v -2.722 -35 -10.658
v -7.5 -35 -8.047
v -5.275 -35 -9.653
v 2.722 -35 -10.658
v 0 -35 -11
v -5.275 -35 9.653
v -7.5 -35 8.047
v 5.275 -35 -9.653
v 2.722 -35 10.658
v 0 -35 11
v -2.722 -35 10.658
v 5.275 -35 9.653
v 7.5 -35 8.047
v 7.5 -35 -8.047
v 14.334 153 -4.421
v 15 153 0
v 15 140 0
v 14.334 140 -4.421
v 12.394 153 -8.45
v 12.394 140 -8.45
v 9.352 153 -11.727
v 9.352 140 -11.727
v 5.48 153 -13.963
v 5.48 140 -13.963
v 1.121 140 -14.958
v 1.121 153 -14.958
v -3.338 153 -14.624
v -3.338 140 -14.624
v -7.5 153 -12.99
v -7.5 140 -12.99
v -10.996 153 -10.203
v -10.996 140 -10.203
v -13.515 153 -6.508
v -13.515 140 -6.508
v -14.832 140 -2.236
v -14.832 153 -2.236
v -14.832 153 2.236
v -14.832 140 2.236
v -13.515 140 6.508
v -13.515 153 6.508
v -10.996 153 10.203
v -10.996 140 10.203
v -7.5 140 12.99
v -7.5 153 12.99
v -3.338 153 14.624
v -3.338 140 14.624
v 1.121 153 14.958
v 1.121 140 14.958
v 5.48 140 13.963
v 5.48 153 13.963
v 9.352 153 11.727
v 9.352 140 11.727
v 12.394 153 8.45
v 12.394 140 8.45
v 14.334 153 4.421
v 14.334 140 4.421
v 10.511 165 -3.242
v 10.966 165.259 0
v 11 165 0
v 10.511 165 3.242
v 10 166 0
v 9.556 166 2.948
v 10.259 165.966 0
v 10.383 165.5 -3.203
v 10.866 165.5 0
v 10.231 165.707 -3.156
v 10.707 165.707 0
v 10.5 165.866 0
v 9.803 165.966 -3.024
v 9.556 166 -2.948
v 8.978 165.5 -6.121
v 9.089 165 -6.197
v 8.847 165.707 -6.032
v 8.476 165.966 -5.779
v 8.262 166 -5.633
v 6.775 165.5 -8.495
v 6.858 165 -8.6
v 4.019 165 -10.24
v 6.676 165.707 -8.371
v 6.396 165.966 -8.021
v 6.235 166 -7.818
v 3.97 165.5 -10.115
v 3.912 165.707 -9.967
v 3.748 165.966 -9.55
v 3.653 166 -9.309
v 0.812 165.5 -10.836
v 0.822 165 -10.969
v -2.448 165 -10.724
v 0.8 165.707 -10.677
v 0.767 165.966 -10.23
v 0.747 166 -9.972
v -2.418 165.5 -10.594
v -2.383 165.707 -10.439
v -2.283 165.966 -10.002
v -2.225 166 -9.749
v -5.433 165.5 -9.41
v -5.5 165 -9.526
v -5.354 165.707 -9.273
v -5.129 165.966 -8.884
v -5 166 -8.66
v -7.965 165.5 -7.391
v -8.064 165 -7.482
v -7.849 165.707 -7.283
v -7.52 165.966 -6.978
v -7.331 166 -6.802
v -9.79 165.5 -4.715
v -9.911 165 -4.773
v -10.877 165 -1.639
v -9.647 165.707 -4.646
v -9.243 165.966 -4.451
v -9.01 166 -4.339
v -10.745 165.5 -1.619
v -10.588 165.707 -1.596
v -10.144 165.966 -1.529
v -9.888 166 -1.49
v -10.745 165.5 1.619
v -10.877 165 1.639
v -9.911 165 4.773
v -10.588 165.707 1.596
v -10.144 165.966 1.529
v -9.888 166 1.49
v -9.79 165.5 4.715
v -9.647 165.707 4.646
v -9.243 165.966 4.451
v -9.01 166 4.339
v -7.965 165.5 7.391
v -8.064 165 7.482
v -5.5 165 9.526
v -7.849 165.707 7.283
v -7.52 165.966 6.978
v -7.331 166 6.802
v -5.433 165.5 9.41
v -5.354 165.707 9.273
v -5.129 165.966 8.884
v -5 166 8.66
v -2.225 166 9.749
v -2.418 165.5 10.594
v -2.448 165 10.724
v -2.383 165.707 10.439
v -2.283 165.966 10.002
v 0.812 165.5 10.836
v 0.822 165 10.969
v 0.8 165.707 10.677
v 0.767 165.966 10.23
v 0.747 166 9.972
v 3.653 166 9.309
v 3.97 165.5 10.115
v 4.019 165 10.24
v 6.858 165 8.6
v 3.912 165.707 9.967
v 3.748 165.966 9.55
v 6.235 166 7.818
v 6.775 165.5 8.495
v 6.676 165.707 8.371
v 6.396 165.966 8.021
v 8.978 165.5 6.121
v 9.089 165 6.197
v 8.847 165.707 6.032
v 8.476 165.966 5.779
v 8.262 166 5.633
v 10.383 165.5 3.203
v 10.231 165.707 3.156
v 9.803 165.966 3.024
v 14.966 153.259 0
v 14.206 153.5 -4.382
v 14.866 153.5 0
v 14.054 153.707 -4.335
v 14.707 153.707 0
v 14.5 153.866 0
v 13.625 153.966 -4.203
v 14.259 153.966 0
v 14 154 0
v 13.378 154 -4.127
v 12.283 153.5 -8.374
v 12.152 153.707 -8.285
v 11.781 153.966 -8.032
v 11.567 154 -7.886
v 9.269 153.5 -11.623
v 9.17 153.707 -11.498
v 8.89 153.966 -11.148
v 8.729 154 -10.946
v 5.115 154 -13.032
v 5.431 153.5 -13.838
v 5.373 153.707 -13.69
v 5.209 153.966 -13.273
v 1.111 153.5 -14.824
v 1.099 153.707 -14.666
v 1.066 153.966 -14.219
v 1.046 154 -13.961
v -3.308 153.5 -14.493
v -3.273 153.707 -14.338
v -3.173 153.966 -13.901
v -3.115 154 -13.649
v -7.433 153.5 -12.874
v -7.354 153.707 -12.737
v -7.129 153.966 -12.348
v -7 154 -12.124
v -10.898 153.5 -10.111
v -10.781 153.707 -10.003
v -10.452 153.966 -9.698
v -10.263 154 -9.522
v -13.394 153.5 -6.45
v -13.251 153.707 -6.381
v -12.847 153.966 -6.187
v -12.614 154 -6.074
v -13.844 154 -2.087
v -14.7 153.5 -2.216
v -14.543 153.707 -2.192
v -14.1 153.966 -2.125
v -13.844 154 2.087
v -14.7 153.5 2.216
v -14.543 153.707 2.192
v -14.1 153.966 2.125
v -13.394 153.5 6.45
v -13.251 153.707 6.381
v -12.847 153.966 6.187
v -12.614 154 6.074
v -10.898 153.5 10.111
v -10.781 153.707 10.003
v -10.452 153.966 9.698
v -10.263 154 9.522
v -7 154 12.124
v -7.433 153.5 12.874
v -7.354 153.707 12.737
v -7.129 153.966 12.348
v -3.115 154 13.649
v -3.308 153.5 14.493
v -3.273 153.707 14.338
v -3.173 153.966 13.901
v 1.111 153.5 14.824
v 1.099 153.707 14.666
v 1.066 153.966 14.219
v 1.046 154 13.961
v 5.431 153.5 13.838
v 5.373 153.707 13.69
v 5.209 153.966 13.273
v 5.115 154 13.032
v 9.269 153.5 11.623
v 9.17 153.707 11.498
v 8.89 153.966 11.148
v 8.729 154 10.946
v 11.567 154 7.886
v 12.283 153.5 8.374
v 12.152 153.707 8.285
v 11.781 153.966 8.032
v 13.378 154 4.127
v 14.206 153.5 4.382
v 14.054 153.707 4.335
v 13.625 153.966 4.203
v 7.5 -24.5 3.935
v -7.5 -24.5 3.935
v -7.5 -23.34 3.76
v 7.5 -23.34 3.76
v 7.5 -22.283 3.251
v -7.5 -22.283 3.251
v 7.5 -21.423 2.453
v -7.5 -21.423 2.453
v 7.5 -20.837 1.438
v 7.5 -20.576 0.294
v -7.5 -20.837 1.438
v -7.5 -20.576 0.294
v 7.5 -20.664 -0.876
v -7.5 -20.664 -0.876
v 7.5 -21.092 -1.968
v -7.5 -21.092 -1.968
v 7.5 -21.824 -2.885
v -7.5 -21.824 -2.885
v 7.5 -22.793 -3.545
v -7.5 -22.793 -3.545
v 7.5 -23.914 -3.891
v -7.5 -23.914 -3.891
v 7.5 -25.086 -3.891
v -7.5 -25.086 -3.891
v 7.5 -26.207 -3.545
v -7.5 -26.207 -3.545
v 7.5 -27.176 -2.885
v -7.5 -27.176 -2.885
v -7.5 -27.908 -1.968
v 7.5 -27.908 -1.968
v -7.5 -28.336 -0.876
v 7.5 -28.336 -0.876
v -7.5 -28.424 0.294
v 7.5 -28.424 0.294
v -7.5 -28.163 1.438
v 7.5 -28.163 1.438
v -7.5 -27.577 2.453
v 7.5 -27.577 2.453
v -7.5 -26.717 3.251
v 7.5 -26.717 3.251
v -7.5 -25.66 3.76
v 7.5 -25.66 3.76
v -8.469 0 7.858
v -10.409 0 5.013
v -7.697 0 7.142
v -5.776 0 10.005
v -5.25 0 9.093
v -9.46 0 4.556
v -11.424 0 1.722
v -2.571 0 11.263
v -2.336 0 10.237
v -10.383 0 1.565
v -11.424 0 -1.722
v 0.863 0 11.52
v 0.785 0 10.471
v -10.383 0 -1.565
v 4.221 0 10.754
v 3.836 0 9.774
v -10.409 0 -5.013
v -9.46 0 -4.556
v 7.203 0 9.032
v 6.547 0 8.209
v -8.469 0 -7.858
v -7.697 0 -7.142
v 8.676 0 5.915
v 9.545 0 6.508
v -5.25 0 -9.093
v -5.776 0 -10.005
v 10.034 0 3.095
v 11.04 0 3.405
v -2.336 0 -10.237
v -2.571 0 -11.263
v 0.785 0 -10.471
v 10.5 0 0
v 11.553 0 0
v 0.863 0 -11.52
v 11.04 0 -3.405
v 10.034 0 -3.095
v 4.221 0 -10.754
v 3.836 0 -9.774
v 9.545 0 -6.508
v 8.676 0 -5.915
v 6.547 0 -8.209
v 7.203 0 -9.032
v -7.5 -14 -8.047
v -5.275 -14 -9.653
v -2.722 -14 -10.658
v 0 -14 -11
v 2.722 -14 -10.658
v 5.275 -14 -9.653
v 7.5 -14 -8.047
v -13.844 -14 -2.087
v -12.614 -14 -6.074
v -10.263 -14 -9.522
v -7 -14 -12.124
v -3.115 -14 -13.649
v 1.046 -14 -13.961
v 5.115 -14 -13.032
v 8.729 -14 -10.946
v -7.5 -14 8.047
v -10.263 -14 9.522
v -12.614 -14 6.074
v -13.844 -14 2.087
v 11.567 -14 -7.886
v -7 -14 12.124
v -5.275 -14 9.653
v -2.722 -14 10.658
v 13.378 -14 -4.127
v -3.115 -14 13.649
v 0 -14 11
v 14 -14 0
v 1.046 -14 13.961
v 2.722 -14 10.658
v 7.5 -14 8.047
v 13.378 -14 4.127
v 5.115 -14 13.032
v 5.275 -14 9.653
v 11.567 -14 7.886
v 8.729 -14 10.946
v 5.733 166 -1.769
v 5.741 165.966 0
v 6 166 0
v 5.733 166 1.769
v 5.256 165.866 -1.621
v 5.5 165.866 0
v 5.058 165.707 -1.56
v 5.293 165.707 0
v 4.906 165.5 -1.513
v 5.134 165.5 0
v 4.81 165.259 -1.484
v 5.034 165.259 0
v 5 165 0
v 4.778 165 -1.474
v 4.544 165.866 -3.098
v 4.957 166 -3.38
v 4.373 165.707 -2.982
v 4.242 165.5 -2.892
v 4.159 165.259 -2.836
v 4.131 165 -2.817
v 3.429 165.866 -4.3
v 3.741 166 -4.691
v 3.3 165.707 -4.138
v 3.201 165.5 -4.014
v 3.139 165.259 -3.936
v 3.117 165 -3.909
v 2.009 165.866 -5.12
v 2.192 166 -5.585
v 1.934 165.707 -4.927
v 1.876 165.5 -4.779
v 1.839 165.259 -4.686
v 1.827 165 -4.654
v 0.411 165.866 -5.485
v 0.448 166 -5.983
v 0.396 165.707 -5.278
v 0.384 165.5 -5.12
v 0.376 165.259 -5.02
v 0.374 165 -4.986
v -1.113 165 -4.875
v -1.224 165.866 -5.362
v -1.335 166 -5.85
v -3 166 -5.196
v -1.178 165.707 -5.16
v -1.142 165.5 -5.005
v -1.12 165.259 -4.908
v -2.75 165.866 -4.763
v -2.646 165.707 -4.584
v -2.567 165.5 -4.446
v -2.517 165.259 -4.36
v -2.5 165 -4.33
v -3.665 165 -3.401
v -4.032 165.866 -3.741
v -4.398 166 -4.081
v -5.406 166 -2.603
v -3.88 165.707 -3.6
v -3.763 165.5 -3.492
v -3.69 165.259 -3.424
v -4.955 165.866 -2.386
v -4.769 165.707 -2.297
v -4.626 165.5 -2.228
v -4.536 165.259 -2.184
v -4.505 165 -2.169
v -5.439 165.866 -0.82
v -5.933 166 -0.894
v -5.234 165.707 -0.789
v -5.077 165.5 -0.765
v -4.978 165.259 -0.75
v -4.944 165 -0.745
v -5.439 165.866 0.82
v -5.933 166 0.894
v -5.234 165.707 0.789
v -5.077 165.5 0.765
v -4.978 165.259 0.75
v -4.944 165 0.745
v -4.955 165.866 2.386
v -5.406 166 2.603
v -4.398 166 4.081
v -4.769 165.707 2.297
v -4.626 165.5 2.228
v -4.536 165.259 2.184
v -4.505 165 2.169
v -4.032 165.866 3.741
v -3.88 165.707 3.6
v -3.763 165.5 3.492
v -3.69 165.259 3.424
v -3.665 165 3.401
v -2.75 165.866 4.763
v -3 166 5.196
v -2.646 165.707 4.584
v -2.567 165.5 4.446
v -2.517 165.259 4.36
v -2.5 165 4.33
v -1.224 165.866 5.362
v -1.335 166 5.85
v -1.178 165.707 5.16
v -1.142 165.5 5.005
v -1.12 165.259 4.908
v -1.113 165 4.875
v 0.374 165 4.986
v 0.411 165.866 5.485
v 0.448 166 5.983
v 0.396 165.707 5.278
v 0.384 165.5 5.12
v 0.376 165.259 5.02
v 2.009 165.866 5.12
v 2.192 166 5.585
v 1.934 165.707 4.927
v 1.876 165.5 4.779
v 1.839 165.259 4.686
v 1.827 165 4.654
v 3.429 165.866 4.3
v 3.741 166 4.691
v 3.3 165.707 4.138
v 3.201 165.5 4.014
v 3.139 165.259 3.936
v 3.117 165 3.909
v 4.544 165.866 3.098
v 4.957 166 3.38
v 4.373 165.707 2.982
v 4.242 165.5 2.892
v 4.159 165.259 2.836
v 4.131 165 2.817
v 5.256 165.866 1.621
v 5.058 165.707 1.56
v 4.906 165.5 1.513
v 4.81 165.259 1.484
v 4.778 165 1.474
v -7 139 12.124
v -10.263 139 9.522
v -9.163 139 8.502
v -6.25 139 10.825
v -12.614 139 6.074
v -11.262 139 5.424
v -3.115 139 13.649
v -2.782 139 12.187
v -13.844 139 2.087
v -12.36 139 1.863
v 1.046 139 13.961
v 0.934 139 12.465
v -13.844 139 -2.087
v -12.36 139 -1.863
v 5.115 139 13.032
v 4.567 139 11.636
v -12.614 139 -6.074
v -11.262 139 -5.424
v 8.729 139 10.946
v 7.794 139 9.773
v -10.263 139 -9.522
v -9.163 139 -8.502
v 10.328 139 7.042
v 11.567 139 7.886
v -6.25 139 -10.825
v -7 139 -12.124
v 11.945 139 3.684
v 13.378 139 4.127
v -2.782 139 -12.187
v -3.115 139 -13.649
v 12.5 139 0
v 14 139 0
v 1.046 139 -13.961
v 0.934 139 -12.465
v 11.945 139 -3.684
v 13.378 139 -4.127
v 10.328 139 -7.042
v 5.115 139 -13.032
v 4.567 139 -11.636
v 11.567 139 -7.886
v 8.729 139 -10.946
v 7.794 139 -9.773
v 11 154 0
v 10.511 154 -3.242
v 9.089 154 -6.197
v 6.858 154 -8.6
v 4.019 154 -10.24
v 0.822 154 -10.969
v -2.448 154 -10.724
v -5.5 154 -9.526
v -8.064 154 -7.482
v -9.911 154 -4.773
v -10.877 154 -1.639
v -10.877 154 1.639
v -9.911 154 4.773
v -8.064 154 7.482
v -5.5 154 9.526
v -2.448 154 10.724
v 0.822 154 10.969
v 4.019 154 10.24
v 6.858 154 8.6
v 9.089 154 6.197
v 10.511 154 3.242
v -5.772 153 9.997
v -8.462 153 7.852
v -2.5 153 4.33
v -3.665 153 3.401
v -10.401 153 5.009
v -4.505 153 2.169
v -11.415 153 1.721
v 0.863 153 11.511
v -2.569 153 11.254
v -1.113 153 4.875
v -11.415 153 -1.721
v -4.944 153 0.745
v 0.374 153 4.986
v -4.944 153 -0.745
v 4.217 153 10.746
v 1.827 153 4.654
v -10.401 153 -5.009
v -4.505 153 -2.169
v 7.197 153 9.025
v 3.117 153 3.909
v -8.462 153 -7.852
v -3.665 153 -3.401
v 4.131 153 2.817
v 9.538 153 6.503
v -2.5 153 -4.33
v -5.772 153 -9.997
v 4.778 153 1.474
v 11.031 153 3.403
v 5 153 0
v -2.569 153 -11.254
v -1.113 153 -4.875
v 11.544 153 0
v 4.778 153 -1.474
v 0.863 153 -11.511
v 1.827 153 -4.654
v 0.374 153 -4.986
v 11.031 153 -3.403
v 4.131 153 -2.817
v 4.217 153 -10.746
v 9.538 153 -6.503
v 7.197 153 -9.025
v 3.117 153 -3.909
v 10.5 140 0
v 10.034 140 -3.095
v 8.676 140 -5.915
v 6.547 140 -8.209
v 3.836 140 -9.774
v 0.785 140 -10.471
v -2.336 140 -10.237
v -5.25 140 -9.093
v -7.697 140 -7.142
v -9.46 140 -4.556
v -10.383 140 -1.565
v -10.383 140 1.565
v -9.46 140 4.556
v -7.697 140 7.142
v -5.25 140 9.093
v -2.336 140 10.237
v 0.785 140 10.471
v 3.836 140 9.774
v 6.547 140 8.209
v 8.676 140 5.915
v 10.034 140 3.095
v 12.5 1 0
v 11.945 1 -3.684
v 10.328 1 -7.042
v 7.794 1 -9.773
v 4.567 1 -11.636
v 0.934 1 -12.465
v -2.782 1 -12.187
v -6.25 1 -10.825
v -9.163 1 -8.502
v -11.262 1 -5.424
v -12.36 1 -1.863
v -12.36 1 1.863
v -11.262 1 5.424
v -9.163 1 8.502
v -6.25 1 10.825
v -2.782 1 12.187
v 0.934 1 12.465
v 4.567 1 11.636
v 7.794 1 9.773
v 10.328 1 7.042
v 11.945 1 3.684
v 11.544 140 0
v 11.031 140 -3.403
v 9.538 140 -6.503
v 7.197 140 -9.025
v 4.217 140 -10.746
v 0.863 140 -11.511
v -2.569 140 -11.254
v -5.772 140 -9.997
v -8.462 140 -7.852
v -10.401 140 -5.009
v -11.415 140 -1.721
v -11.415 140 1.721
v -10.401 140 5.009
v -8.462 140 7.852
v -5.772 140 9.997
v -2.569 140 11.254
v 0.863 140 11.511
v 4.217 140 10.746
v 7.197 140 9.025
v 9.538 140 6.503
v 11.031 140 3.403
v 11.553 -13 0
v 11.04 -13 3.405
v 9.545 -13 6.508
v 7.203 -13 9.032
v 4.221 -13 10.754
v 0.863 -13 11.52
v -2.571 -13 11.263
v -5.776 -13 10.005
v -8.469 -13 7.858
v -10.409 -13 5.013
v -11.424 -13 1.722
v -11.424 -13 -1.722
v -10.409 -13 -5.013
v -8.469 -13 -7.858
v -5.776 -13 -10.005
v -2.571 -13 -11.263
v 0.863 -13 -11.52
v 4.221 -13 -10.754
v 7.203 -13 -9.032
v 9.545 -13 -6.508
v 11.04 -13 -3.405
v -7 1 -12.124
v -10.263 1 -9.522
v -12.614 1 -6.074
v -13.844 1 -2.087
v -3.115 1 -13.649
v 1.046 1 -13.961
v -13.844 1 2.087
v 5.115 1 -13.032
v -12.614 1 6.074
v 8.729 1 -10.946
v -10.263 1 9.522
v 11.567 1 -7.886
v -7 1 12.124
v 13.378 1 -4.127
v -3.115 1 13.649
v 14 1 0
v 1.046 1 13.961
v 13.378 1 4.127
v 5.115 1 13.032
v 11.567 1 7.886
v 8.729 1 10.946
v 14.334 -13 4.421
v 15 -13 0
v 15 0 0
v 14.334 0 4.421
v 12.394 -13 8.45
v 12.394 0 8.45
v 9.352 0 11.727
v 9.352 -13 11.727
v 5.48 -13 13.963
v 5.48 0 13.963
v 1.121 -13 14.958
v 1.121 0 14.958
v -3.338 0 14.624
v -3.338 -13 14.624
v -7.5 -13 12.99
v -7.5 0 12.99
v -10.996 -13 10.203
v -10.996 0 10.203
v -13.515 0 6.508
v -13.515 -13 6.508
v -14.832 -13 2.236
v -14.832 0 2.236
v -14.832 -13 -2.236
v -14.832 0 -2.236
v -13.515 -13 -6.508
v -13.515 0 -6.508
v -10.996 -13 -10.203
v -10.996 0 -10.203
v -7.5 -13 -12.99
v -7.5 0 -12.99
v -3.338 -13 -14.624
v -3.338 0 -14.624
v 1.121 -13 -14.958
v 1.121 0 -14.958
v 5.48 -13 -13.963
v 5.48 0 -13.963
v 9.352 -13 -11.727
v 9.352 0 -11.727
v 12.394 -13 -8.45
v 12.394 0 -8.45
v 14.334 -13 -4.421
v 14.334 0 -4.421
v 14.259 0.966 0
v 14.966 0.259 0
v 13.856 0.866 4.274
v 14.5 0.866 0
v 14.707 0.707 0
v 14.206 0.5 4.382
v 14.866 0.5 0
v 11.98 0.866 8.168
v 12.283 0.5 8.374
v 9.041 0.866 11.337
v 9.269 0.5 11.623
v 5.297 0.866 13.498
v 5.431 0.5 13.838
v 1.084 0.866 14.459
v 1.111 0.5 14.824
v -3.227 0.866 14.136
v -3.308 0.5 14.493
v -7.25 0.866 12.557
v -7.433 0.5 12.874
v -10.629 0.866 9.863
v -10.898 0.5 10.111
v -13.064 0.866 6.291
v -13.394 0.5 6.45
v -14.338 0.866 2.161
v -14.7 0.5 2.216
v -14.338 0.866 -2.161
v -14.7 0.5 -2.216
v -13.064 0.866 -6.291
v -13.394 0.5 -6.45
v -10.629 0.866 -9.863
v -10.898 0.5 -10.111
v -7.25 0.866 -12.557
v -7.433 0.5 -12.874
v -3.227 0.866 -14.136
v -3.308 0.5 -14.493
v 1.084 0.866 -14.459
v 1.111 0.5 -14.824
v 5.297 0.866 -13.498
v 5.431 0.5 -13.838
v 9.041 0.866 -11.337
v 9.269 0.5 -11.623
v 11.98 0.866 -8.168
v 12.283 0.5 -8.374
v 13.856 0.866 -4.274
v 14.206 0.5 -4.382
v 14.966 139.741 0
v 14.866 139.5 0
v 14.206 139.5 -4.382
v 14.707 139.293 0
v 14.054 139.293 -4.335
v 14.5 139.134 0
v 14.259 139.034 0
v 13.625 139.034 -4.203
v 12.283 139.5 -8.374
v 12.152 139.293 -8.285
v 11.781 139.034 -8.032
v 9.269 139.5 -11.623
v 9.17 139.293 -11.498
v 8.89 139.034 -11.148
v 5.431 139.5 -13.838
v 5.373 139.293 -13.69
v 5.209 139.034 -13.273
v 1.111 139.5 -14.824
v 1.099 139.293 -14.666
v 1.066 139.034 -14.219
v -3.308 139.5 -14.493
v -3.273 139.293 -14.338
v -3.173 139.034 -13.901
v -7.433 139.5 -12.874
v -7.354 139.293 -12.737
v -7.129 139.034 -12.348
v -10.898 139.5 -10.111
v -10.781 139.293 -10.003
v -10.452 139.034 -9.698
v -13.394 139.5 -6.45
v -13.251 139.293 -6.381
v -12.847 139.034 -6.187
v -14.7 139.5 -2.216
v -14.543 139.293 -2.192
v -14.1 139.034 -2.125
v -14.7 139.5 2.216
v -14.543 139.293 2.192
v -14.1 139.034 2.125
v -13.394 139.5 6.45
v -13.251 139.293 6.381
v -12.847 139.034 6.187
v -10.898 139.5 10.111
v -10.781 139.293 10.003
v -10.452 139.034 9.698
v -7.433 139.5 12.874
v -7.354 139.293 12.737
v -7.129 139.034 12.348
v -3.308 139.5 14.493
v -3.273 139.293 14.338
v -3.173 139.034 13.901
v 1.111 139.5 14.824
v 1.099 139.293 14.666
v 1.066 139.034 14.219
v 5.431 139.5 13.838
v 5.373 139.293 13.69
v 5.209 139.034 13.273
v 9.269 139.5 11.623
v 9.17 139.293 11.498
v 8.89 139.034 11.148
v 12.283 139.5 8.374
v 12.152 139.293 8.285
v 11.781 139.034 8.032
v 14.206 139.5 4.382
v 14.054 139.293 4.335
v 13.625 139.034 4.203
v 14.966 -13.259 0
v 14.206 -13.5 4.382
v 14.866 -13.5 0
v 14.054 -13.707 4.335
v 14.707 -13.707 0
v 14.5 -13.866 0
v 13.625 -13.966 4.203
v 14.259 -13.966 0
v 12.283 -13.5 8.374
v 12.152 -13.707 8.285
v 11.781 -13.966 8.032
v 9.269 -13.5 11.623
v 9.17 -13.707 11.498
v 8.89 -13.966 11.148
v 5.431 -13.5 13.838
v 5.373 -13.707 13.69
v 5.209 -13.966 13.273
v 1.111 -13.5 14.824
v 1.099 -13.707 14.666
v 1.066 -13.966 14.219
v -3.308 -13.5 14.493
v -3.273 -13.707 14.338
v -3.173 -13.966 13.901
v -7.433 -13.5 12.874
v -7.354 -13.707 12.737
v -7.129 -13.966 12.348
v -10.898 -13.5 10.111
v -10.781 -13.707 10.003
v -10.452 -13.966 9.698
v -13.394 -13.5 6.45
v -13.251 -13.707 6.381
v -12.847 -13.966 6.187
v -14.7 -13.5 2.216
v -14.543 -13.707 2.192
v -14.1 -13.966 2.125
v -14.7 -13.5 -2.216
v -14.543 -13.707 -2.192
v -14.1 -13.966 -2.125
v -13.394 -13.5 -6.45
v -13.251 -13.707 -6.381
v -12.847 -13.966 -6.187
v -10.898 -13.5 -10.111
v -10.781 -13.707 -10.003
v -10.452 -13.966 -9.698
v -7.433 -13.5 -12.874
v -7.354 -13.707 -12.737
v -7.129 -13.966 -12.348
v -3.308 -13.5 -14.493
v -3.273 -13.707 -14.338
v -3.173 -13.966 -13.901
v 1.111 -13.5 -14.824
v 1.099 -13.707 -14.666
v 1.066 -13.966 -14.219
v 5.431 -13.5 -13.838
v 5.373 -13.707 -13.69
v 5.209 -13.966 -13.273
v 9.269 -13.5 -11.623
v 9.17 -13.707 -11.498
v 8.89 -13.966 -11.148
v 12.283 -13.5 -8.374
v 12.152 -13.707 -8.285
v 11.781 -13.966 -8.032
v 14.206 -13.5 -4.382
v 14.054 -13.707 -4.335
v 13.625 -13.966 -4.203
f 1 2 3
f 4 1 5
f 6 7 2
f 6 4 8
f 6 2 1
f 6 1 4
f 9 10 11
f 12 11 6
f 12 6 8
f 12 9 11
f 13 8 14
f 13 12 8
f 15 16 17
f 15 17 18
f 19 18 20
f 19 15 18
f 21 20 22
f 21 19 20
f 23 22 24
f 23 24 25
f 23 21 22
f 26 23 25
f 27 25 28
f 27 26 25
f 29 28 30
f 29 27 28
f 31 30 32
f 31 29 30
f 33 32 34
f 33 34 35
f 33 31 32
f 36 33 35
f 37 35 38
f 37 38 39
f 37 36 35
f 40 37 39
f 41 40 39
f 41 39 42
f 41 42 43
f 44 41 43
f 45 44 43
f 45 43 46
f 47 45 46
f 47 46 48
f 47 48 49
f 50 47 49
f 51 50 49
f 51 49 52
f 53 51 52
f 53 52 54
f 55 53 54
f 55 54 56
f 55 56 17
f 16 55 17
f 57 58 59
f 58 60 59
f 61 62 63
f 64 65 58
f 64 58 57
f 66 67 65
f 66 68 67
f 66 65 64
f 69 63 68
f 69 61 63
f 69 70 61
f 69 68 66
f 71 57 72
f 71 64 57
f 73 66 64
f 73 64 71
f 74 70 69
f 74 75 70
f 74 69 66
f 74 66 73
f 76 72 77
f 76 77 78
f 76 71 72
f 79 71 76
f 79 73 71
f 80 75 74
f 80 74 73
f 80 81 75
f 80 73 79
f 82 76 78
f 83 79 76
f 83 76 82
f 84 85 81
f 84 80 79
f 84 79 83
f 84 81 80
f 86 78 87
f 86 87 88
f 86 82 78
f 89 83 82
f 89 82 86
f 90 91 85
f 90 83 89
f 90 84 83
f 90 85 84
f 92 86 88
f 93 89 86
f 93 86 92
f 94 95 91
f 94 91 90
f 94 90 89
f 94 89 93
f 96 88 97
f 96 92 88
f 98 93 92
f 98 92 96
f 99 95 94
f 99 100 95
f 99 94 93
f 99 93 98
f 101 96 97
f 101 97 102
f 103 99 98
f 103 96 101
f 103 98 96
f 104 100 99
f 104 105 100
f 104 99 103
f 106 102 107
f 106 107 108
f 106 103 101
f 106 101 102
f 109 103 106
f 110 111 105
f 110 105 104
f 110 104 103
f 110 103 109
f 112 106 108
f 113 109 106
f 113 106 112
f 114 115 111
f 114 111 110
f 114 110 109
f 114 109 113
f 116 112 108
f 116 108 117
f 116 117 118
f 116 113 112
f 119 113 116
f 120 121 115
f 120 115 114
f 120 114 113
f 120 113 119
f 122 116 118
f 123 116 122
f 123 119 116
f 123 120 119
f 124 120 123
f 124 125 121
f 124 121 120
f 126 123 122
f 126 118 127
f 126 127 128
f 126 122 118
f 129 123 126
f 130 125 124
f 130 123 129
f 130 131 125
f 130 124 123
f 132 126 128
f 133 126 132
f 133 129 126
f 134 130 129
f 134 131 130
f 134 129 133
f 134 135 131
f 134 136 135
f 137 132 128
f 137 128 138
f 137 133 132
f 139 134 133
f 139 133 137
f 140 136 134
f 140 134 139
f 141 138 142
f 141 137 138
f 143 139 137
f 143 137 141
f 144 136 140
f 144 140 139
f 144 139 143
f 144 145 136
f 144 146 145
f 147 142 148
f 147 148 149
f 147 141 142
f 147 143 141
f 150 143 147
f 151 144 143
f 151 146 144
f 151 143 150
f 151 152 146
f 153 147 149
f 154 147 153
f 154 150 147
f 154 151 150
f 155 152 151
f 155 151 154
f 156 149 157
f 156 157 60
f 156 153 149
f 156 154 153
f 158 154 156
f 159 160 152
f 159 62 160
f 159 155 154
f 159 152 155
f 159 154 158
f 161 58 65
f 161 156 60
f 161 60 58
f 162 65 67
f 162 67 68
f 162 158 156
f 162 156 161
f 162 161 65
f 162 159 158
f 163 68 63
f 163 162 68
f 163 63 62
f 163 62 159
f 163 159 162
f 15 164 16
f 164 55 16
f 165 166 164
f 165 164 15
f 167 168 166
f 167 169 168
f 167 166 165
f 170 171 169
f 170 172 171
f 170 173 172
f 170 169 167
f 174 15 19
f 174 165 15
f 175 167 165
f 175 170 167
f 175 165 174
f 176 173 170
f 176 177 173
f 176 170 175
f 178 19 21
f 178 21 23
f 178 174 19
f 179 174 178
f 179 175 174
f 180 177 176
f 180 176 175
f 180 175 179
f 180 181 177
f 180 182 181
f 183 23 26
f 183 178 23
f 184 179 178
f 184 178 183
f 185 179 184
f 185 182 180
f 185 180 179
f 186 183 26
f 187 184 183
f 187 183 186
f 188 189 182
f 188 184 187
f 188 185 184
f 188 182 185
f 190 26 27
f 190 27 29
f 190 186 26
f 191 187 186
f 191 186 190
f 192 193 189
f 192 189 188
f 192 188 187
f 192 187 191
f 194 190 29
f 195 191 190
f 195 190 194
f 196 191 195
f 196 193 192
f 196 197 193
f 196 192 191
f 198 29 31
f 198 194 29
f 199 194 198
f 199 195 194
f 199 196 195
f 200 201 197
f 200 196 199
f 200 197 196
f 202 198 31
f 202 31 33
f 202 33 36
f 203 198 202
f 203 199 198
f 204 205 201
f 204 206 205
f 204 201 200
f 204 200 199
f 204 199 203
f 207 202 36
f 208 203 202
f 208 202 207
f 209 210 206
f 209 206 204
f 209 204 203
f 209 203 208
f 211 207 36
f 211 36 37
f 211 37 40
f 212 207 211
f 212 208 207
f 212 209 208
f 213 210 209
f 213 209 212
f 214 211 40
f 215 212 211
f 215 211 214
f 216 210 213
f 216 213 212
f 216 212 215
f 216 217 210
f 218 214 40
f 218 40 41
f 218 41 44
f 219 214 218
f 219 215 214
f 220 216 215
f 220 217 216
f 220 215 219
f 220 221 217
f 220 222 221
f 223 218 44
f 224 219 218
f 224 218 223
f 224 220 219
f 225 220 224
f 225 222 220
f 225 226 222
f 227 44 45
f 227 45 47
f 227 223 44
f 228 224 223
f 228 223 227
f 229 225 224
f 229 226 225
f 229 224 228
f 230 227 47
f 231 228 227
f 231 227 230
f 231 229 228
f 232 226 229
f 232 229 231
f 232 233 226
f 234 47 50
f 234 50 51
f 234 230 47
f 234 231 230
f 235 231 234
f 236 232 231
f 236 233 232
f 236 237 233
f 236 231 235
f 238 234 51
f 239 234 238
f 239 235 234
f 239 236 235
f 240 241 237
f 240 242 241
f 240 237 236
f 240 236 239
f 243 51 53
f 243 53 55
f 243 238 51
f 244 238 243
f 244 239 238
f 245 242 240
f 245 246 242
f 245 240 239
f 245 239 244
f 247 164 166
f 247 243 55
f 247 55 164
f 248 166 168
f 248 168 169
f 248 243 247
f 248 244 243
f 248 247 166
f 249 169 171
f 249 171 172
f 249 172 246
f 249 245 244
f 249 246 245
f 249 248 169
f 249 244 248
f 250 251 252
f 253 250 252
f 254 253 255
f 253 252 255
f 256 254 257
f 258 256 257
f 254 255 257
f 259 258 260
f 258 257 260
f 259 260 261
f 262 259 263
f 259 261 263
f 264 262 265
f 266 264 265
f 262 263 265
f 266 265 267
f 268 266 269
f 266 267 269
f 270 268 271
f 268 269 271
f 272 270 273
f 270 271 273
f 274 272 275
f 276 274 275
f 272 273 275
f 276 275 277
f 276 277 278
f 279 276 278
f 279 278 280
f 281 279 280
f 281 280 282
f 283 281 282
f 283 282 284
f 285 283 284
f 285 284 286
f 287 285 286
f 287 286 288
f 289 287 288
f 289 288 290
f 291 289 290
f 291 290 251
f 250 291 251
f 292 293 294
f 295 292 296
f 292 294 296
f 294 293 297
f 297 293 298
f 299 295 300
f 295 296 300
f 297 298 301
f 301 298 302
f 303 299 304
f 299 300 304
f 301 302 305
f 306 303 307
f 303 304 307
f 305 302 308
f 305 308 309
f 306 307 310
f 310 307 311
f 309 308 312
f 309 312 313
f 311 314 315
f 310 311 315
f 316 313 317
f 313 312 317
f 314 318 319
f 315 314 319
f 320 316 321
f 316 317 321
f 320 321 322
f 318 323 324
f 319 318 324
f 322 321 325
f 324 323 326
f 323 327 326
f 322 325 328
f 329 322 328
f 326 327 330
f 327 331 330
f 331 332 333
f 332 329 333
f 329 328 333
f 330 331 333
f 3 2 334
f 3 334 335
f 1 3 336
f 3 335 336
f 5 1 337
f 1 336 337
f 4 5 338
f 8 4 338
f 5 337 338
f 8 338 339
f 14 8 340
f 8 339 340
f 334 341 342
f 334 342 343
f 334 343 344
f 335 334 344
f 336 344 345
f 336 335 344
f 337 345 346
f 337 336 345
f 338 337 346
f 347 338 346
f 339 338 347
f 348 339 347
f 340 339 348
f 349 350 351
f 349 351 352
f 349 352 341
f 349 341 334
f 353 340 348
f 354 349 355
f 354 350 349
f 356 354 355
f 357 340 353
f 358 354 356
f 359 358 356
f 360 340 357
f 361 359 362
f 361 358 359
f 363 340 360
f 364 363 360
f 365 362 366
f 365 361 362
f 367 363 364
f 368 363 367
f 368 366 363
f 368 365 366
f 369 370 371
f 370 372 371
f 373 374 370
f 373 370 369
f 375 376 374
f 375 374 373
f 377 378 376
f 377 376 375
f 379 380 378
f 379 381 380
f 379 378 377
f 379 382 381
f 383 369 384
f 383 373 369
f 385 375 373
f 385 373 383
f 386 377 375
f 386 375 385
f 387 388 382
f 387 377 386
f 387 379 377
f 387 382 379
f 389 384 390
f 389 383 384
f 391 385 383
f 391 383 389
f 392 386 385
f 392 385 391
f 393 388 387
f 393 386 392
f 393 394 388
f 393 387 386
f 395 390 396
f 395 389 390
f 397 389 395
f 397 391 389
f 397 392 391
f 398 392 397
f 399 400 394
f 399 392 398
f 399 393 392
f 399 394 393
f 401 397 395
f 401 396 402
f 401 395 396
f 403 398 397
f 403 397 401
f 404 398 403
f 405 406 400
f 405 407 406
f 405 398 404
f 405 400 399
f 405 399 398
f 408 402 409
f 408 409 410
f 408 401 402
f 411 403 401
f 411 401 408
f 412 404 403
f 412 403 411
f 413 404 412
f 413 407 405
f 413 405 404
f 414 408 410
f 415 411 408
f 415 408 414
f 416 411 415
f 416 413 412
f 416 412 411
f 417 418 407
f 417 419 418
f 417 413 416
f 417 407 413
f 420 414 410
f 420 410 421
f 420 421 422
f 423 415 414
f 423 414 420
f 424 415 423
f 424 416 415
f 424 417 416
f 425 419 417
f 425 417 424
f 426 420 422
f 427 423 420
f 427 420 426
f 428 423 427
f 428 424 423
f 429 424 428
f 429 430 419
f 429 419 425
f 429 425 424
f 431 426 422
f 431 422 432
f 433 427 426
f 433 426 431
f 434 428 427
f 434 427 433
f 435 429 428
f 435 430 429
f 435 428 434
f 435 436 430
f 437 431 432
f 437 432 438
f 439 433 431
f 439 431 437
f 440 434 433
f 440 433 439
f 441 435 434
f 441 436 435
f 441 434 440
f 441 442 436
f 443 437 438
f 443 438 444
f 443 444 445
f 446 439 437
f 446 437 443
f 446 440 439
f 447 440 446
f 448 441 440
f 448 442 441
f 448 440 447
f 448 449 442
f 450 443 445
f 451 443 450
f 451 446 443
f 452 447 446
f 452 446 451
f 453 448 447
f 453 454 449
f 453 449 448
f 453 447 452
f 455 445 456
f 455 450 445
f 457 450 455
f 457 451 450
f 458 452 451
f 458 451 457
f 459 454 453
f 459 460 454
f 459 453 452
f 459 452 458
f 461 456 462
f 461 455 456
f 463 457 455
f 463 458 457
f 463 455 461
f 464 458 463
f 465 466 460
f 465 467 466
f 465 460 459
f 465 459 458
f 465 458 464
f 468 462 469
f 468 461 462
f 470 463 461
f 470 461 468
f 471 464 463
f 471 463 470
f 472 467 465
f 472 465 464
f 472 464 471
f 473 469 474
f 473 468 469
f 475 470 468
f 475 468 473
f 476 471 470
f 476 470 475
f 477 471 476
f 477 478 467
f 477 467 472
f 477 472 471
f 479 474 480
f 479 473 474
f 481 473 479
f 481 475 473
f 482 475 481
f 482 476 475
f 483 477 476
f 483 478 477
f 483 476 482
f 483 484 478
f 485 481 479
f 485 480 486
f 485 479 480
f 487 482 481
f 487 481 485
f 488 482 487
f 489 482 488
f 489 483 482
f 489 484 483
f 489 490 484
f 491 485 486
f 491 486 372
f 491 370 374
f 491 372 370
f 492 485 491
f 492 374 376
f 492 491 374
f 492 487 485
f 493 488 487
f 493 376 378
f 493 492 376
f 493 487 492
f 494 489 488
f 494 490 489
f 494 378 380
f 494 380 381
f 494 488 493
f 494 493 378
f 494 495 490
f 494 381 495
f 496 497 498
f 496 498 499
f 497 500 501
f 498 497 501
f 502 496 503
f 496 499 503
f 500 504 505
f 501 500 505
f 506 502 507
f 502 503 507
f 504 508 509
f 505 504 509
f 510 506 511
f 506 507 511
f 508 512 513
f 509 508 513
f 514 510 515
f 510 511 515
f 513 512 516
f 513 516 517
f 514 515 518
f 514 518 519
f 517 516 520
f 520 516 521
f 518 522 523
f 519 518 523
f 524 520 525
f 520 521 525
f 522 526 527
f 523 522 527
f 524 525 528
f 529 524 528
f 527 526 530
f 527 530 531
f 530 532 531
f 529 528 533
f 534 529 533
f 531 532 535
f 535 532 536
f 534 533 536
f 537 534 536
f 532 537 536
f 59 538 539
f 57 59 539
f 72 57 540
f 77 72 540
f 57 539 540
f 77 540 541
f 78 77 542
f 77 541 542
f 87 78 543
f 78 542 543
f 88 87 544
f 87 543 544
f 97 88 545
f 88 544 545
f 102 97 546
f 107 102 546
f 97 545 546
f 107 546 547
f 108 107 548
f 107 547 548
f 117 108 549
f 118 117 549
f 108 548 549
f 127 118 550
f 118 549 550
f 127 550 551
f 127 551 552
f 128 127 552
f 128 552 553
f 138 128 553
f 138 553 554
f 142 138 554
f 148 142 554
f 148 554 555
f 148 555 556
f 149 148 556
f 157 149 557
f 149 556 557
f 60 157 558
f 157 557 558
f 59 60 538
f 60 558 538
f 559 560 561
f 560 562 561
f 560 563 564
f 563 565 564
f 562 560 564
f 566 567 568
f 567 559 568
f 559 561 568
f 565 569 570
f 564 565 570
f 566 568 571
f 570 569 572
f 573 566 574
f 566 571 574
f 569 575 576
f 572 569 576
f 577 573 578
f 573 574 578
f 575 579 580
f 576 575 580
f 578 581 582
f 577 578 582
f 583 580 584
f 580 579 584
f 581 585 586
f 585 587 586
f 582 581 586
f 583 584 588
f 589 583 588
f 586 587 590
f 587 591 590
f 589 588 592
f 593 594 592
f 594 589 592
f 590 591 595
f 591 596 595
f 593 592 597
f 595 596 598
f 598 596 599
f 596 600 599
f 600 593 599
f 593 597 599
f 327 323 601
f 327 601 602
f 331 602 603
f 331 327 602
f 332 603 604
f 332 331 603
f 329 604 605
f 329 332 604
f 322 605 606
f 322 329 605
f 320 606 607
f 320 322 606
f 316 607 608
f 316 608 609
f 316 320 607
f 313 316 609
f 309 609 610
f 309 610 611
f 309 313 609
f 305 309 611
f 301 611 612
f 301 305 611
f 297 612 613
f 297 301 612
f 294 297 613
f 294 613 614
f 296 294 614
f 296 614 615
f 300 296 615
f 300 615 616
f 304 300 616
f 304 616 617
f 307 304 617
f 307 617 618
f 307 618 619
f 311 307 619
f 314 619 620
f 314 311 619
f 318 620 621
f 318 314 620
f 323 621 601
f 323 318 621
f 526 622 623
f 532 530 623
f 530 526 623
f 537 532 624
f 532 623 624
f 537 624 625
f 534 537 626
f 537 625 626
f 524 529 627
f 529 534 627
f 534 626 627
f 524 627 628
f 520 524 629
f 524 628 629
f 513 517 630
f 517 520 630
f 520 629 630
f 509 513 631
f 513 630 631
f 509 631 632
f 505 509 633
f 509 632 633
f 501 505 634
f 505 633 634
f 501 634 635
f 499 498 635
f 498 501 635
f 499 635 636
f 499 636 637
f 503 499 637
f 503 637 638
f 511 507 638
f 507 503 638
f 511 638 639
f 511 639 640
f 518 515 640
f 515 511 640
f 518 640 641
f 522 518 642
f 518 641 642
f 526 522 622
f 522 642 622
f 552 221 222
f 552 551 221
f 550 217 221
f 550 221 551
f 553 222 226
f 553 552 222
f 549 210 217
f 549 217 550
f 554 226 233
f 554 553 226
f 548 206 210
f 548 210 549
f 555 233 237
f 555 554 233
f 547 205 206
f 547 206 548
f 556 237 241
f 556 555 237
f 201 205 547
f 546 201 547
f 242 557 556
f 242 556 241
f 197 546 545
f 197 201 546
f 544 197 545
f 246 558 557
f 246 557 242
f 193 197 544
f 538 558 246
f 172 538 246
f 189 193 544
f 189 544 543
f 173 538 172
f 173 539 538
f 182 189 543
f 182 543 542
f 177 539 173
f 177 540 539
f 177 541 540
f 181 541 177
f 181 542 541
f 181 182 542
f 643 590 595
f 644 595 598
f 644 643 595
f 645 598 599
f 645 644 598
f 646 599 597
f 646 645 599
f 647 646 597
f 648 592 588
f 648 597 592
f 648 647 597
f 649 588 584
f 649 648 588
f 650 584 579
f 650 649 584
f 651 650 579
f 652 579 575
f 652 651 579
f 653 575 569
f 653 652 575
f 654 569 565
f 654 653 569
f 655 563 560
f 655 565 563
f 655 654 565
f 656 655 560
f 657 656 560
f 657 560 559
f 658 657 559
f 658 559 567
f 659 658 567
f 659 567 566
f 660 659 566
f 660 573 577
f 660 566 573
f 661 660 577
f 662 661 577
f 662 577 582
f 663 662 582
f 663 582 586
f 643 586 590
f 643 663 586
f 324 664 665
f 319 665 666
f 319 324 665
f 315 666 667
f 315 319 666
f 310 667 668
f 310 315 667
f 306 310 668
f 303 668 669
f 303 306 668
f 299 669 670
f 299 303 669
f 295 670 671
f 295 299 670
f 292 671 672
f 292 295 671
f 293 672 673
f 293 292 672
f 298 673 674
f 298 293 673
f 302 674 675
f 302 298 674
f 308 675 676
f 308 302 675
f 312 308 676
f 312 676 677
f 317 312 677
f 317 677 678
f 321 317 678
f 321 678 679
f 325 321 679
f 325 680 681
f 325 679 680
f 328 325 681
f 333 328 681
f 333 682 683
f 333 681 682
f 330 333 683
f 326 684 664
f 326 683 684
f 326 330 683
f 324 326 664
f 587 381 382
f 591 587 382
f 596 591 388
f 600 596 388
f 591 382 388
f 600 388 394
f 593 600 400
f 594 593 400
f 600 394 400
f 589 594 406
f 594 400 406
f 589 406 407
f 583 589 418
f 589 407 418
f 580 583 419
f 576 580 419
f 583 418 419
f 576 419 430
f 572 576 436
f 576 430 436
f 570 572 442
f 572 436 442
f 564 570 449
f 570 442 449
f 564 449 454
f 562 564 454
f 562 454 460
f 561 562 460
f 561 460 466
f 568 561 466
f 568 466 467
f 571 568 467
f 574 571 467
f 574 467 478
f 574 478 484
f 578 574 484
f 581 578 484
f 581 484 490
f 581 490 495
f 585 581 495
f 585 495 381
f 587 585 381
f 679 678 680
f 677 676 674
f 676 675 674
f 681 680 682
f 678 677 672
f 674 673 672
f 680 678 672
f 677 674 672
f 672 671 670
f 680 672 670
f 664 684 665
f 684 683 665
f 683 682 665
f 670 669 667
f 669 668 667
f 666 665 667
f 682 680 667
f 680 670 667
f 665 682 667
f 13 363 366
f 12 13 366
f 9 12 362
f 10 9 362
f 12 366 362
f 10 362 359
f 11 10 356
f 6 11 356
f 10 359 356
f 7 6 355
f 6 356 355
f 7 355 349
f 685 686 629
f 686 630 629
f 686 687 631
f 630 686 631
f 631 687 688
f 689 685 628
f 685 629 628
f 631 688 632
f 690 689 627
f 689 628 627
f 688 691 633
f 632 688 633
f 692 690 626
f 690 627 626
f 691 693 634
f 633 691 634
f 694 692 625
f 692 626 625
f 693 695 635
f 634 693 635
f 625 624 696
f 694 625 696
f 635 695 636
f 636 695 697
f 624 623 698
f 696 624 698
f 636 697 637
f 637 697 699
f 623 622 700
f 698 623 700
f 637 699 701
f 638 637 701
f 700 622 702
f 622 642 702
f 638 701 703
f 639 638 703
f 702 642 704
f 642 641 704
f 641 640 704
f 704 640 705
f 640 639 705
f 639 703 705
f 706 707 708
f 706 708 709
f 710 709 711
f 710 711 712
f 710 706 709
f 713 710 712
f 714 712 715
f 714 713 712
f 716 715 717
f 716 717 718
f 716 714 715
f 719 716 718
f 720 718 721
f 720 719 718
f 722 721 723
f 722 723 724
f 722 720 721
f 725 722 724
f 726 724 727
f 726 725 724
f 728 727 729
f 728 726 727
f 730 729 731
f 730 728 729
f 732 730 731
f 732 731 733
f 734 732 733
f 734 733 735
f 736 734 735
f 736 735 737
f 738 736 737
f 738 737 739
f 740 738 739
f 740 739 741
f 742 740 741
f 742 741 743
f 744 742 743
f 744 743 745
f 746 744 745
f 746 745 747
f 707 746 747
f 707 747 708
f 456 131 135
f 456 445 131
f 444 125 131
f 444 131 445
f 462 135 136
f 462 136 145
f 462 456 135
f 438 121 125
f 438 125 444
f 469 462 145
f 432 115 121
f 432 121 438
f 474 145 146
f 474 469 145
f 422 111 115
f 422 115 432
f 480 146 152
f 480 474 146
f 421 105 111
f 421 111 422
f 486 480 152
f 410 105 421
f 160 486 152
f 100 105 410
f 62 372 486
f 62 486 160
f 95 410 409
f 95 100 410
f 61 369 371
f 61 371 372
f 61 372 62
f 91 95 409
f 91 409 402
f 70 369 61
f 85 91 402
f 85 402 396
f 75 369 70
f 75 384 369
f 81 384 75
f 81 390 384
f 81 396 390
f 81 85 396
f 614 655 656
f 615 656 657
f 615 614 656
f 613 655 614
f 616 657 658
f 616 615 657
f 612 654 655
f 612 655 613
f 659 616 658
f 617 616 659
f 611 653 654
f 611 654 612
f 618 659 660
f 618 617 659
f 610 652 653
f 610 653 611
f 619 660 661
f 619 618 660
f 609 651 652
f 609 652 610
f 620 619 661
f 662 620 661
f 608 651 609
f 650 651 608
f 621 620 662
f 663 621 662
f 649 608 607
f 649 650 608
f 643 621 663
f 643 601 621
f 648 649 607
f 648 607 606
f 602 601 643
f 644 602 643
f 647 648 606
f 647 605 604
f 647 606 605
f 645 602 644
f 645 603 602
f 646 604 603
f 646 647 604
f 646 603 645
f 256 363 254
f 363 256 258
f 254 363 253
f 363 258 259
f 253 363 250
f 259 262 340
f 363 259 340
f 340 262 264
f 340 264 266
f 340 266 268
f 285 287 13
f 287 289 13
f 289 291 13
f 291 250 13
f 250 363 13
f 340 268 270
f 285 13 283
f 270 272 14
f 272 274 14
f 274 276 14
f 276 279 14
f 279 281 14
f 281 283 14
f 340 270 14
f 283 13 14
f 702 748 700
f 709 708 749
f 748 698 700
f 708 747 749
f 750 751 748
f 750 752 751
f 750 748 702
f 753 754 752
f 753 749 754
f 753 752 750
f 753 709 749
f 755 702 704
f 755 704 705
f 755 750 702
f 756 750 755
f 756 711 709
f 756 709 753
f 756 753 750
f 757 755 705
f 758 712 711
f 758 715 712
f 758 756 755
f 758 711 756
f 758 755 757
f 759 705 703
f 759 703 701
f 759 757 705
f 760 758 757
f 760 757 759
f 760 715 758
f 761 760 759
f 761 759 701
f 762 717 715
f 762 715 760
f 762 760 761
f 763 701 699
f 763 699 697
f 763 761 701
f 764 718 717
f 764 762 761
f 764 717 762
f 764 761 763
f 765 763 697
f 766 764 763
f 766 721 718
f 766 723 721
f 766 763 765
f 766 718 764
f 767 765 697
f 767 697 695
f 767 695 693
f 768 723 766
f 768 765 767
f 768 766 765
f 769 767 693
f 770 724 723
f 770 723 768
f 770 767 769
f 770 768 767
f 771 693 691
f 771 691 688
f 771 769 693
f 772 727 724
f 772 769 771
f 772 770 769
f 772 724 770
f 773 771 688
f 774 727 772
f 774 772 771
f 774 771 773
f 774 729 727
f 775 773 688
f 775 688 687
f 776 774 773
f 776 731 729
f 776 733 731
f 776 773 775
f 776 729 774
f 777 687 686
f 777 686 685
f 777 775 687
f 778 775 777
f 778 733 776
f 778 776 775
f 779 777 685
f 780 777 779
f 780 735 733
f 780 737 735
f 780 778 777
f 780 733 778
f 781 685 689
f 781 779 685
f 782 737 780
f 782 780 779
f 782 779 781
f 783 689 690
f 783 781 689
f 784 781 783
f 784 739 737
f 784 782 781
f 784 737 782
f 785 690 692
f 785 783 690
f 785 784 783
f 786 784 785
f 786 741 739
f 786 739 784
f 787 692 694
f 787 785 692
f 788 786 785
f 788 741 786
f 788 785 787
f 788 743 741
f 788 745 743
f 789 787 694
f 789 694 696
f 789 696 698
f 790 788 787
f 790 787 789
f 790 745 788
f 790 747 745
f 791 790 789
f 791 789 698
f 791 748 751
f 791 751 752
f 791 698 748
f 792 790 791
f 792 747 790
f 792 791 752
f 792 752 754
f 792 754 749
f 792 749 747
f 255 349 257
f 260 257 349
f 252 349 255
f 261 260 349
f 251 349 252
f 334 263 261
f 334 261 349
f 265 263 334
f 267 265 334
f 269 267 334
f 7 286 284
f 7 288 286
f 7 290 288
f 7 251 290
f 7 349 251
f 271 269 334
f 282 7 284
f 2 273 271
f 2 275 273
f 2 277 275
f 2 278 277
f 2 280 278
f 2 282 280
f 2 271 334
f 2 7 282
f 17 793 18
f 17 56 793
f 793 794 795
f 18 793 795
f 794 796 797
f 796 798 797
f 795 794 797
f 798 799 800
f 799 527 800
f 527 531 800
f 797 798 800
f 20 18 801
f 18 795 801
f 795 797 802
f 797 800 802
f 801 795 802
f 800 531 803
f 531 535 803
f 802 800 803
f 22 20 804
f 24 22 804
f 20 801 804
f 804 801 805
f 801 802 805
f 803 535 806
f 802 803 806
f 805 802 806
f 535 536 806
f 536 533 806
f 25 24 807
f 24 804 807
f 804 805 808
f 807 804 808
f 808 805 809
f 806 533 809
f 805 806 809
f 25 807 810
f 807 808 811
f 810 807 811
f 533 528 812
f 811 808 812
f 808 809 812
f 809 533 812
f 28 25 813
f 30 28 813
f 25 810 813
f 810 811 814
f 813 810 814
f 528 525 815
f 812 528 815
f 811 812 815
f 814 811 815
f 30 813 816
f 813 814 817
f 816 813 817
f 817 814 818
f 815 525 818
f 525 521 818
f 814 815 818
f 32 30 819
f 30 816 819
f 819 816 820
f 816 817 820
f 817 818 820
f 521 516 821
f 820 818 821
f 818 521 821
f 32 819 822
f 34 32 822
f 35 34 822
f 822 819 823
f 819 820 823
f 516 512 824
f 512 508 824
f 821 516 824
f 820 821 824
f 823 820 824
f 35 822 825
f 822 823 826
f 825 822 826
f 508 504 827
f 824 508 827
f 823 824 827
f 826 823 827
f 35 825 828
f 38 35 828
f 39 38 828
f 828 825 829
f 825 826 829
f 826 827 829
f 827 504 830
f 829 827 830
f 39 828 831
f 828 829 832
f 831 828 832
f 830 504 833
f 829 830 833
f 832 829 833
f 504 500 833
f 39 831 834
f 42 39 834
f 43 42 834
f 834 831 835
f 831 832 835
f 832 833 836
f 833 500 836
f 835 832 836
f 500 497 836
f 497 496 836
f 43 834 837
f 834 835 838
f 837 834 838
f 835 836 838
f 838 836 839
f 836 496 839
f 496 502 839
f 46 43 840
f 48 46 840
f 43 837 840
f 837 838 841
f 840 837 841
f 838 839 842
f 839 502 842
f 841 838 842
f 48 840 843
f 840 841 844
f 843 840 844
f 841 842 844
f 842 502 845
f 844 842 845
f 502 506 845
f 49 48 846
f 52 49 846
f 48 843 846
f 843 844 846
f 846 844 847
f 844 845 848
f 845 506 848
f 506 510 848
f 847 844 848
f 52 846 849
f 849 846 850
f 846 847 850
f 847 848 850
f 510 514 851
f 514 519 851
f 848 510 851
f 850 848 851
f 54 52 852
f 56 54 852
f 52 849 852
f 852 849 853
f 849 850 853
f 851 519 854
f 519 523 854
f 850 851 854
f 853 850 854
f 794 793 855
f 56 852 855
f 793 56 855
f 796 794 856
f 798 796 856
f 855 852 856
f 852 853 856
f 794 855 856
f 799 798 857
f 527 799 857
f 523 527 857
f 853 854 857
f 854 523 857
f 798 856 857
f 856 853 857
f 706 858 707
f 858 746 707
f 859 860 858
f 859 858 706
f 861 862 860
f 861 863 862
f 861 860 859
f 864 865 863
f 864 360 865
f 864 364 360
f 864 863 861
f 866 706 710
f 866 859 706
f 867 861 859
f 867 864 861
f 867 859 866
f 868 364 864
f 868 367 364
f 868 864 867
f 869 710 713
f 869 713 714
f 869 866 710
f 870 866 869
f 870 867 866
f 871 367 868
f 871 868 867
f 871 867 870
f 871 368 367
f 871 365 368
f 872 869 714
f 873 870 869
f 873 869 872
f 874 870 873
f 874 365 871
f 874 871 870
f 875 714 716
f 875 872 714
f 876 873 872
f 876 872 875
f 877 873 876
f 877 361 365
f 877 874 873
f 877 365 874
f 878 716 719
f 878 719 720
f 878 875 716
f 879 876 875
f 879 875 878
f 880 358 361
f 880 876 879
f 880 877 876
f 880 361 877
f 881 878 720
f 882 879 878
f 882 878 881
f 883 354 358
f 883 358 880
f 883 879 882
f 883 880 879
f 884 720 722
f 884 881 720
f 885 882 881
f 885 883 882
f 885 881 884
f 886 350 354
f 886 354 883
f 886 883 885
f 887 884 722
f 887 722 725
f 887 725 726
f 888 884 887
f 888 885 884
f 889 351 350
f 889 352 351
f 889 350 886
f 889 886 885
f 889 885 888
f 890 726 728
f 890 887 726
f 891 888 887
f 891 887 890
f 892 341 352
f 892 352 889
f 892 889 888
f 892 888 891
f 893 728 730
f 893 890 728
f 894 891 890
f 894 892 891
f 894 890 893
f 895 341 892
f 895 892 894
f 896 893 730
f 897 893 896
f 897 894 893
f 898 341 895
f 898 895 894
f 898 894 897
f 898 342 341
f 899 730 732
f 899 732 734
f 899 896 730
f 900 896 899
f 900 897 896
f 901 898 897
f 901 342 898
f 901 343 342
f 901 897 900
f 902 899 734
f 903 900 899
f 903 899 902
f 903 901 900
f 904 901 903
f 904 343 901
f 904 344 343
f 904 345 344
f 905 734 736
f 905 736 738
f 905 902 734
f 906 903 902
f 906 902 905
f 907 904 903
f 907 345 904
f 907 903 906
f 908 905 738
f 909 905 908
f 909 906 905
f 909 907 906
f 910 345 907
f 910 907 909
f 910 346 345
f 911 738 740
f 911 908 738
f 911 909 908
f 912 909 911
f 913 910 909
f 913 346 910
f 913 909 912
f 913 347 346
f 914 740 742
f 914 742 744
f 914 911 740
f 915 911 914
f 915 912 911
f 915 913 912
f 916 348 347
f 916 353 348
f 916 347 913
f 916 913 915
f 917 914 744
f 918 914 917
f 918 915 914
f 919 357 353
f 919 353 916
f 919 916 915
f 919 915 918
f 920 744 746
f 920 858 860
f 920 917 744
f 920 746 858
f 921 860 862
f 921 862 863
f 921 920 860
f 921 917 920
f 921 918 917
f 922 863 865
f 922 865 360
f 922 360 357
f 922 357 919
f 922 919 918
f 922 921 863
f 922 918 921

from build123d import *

# Parameters (mm, degrees)
SKETCH5_R                = 12.5
SKETCH5_R_2              = 10.5
BOSS_EXTRUDE2_DEPTH      = 140
SKETCH6_R                = 15
SKETCH6_R_2              = 11.543764588
BOSS_EXTRUDE3_DEPTH      = 14
BOSS_EXTRUDE3_DEPTH_BACK = 1
SKETCH7_R                = 15
SKETCH7_R_2              = 11.552767092
BOSS_EXTRUDE4_DEPTH      = 14
BOSS_EXTRUDE4_DEPTH_BACK = 1
FILLET1_R                = 1
FILLET2_R                = 1
FILLET3_R                = 1
FILLET4_R                = 1
SKETCH8_R                = 12.593226889
BOSS_EXTRUDE5_DEPTH      = 1
SKETCH9_R                = 12.737258032
BOSS_EXTRUDE6_DEPTH      = 1
SKETCH10_R               = 11
BOSS_EXTRUDE7_DEPTH      = 21
CUT_EXTRUDE1_DEPTH       = 21
SKETCH12_R               = 3.935
CUT_EXTRUDE2_DEPTH       = 23.5000001
SKETCH13_R               = 11
BOSS_EXTRUDE8_DEPTH      = 12
SKETCH14_R               = 5
CUT_EXTRUDE3_DEPTH       = 20
FILLET5_R                = 1
FILLET6_R                = 1


with BuildPart() as part:
    # Sketch5 → Boss-Extrude2 (new body)
    with BuildSketch(Plane(origin=(0, 0, 0), x_dir=(1, 0, 0), z_dir=(0, 1, 0))):
        Circle(SKETCH5_R)
        Circle(SKETCH5_R_2, mode=Mode.SUBTRACT)
    extrude(amount=BOSS_EXTRUDE2_DEPTH)

    # Sketch6 → Boss-Extrude3 (add, two sides)
    with BuildSketch(Plane(origin=(0, 140, 0), x_dir=(1, 0, 0), z_dir=(0, 1, 0))) as boss_extrude3_sk:
        Circle(SKETCH6_R)
        Circle(SKETCH6_R_2, mode=Mode.SUBTRACT)
    extrude(amount=BOSS_EXTRUDE3_DEPTH)
    extrude(boss_extrude3_sk.sketch, amount=-BOSS_EXTRUDE3_DEPTH_BACK)

    # Sketch7 → Boss-Extrude4 (add, two sides)
    with BuildSketch(Plane.XZ) as boss_extrude4_sk:
        Circle(SKETCH7_R)
        Circle(SKETCH7_R_2, mode=Mode.SUBTRACT)
    extrude(amount=BOSS_EXTRUDE4_DEPTH)
    extrude(boss_extrude4_sk.sketch, amount=-BOSS_EXTRUDE4_DEPTH_BACK)

    # Fillet1
    fillet1_edges = [part.edges().sort_by_distance(p)[0] for p in [
        (-15, 139, 0),
    ]]
    fillet(fillet1_edges, radius=FILLET1_R)

    # Fillet2
    fillet2_edges = [part.edges().sort_by_distance(p)[0] for p in [
        (-15, 1, 0),
    ]]
    fillet(fillet2_edges, radius=FILLET2_R)

    # Fillet3
    fillet3_edges = [part.edges().sort_by_distance(p)[0] for p in [
        (-15, 154, 0),
    ]]
    fillet(fillet3_edges, radius=FILLET3_R)

    # Fillet4
    fillet4_edges = [part.edges().sort_by_distance(p)[0] for p in [
        (-15, -14, 0),
    ]]
    fillet(fillet4_edges, radius=FILLET4_R)

    # Sketch8 → Boss-Extrude5 (add)
    with BuildSketch(Plane(origin=(0, 154, 0), x_dir=(1, 0, 0), z_dir=(0, 1, 0))):
        Circle(SKETCH8_R)
    extrude(amount=-BOSS_EXTRUDE5_DEPTH)

    # Sketch9 → Boss-Extrude6 (add)
    with BuildSketch(Plane.XZ.offset(14)):
        Circle(SKETCH9_R)
    extrude(amount=-BOSS_EXTRUDE6_DEPTH)

    # Sketch10 → Boss-Extrude7 (add)
    with BuildSketch(Plane.XZ.offset(14)):
        Circle(SKETCH10_R)
    extrude(amount=BOSS_EXTRUDE7_DEPTH)

    # Sketch11 → Cut-Extrude1 (cut)
    with BuildSketch(Plane.XZ.offset(35)):
        with BuildLine():
            Line((-7.5, 8.04673847), (-7.5, 0))
            Line((-7.5, 0), (-7.5, -8.04673847))
            ThreePointArc((-7.5, -8.04673847), (-11, 0), (-7.5, 8.04673847))
        make_face()
        with BuildLine():
            Line((7.5, 0), (7.5, -8.04673847))
            ThreePointArc((7.5, -8.04673847), (11, 0), (7.5, 8.04673847))
            Line((7.5, 8.04673847), (7.5, 0))
        make_face()
    extrude(amount=-CUT_EXTRUDE1_DEPTH, mode=Mode.SUBTRACT)

    # Sketch12 → Cut-Extrude2 (cut, through all)
    with BuildSketch(Plane.ZY.offset(7.5)):
        with Locations((0, -24.5)):
            Circle(SKETCH12_R)
    extrude(amount=-CUT_EXTRUDE2_DEPTH, mode=Mode.SUBTRACT)

    # Sketch13 → Boss-Extrude8 (add)
    with BuildSketch(Plane(origin=(0, 154, 0), x_dir=(1, 0, 0), z_dir=(0, 1, 0))):
        Circle(SKETCH13_R)
    extrude(amount=BOSS_EXTRUDE8_DEPTH)

    # Sketch14 → Cut-Extrude3 (cut)
    with BuildSketch(Plane(origin=(0, 166, 0), x_dir=(1, 0, 0), z_dir=(0, 1, 0))):
        Circle(SKETCH14_R)
    extrude(amount=-CUT_EXTRUDE3_DEPTH, mode=Mode.SUBTRACT)

    # Fillet5
    fillet5_edges = [part.edges().sort_by_distance(p)[0] for p in [
        (-11, 166, 0),
    ]]
    fillet(fillet5_edges, radius=FILLET5_R)

    # Fillet6
    fillet6_edges = [part.edges().sort_by_distance(p)[0] for p in [
        (-5, 166, 0),
    ]]
    fillet(fillet6_edges, radius=FILLET6_R)


solid = part.part
